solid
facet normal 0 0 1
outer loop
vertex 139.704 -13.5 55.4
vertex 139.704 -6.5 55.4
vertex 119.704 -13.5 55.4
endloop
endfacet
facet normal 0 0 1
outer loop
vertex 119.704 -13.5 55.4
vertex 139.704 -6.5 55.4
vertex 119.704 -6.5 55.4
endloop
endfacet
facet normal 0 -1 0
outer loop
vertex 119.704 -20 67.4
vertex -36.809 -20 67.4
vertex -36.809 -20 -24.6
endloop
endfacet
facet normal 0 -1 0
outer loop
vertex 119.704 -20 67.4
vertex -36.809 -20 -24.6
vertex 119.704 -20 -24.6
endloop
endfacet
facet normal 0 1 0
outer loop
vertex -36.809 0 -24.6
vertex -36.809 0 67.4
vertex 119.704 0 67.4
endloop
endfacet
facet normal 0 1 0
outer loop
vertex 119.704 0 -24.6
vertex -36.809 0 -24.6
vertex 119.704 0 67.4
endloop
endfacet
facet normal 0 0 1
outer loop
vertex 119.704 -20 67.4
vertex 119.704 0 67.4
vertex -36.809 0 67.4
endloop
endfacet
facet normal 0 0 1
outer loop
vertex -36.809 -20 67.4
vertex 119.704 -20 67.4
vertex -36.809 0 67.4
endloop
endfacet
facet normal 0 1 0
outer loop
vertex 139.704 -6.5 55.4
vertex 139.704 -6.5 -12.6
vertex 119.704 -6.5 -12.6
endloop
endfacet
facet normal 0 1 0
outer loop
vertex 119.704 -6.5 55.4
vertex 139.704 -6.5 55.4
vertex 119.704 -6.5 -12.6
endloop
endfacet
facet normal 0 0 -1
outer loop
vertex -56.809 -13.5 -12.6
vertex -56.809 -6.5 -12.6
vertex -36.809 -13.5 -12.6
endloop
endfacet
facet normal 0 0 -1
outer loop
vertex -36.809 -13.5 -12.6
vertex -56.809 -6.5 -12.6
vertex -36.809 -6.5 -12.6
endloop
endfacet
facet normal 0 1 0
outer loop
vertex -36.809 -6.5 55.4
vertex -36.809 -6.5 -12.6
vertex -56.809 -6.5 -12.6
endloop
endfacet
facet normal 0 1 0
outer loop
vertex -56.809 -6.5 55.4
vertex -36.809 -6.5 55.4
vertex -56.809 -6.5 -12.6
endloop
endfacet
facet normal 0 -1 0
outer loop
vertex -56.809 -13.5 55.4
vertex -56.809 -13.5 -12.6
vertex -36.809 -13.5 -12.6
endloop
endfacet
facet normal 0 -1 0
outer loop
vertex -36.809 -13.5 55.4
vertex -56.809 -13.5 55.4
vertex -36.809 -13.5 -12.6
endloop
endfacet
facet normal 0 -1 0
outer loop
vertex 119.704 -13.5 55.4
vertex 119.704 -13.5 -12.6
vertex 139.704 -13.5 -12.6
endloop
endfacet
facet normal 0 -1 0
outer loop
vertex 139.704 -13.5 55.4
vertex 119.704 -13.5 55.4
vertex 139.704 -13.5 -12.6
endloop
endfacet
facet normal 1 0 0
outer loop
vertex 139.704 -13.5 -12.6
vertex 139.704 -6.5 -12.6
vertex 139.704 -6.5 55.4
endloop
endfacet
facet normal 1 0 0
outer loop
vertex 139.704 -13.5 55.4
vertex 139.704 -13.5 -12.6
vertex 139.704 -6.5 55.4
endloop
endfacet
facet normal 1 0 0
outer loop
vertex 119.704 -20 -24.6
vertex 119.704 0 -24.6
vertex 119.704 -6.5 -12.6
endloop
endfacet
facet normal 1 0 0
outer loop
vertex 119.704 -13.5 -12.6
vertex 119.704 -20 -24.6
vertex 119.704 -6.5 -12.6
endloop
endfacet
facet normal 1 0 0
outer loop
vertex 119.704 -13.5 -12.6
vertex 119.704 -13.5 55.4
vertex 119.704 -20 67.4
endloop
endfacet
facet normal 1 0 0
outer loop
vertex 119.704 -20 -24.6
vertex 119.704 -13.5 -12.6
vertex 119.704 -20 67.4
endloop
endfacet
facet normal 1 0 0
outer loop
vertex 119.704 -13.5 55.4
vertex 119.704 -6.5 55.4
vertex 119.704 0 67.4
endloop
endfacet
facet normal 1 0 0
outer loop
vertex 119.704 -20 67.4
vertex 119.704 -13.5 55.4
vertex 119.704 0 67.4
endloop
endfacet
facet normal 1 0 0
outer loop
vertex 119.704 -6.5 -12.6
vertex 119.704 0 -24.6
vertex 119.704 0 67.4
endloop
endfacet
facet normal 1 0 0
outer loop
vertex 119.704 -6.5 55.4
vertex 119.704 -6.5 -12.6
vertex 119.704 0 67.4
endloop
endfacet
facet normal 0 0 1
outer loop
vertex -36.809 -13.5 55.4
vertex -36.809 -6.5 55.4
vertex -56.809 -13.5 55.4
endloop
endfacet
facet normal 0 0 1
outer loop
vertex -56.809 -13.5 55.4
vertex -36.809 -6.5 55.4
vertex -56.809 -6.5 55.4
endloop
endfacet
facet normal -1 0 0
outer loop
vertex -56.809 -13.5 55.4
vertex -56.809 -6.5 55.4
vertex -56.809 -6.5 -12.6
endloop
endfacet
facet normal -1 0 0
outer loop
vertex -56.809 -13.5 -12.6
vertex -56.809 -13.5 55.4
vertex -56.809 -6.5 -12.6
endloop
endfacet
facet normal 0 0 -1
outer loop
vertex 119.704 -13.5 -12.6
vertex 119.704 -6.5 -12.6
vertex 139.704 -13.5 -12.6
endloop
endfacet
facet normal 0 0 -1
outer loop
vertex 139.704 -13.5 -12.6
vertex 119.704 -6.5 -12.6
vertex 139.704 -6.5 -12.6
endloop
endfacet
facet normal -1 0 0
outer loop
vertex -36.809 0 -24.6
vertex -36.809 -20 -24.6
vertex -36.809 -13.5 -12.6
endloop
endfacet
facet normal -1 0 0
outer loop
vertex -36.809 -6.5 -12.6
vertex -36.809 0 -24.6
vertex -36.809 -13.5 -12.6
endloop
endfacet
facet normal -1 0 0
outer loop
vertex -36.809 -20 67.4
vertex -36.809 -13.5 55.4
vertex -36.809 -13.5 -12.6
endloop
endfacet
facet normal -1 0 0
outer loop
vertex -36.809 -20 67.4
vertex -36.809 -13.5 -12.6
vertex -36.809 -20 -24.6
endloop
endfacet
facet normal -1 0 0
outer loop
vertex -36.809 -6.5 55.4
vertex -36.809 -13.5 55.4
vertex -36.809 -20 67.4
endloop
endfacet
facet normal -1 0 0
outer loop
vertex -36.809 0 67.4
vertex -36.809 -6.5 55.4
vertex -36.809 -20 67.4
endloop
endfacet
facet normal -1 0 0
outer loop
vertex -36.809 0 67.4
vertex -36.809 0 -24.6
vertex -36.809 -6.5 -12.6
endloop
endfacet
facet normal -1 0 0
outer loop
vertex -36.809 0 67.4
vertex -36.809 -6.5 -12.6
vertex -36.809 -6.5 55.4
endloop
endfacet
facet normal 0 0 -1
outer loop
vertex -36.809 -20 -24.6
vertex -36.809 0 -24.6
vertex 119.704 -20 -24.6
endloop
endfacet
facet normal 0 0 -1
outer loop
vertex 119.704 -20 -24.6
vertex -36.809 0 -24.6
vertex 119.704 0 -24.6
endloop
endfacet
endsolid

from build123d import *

# Parameters (mm, degrees)
F1_DEPTH = 20
F2_W     = 20
F2_H     = 68
F3_DEPTH = 6.5
F4_W     = 20
F4_H     = 68
F5_DEPTH = 6.5


with BuildPart() as f1:
    # F0 (on Front) → F1 (new body)
    with BuildSketch(Plane.XZ):
        Polygon((-56.8088, 55.399762), (-56.8088, -12.600238), (-36.8088, -12.600238), (-36.8088, -24.600238), (119.704261, -24.600238), (119.704261, -12.600238), (139.704261, -12.600238), (139.704261, 55.399762), (119.704261, 55.399762), (119.704261, 67.399762), (-36.8088, 67.399762), (-36.8088, 55.399762), align=None)
    extrude(amount=F1_DEPTH)

    # F2 (on face) → F3 (cut)
    with BuildSketch(Plane.XZ.offset(20)):
        with Locations((129.704261, 21.399762)):
            Rectangle(F2_W, F2_H)
        with Locations((-46.8088, 21.399762)):
            Rectangle(F2_W, F2_H)
    extrude(amount=-F3_DEPTH, mode=Mode.SUBTRACT)

    # F4 (on face) → F5 (cut)
    with BuildSketch(Plane(origin=(0, 0, 0), x_dir=(-1, 0, 0), z_dir=(0, 1, 0))):
        with Locations((-129.704261, 21.399762)):
            Rectangle(F4_W, F4_H)
        with Locations((46.8088, 21.399762)):
            Rectangle(F4_W, F4_H)
    extrude(amount=-F5_DEPTH, mode=Mode.SUBTRACT)


solid = f1.part
